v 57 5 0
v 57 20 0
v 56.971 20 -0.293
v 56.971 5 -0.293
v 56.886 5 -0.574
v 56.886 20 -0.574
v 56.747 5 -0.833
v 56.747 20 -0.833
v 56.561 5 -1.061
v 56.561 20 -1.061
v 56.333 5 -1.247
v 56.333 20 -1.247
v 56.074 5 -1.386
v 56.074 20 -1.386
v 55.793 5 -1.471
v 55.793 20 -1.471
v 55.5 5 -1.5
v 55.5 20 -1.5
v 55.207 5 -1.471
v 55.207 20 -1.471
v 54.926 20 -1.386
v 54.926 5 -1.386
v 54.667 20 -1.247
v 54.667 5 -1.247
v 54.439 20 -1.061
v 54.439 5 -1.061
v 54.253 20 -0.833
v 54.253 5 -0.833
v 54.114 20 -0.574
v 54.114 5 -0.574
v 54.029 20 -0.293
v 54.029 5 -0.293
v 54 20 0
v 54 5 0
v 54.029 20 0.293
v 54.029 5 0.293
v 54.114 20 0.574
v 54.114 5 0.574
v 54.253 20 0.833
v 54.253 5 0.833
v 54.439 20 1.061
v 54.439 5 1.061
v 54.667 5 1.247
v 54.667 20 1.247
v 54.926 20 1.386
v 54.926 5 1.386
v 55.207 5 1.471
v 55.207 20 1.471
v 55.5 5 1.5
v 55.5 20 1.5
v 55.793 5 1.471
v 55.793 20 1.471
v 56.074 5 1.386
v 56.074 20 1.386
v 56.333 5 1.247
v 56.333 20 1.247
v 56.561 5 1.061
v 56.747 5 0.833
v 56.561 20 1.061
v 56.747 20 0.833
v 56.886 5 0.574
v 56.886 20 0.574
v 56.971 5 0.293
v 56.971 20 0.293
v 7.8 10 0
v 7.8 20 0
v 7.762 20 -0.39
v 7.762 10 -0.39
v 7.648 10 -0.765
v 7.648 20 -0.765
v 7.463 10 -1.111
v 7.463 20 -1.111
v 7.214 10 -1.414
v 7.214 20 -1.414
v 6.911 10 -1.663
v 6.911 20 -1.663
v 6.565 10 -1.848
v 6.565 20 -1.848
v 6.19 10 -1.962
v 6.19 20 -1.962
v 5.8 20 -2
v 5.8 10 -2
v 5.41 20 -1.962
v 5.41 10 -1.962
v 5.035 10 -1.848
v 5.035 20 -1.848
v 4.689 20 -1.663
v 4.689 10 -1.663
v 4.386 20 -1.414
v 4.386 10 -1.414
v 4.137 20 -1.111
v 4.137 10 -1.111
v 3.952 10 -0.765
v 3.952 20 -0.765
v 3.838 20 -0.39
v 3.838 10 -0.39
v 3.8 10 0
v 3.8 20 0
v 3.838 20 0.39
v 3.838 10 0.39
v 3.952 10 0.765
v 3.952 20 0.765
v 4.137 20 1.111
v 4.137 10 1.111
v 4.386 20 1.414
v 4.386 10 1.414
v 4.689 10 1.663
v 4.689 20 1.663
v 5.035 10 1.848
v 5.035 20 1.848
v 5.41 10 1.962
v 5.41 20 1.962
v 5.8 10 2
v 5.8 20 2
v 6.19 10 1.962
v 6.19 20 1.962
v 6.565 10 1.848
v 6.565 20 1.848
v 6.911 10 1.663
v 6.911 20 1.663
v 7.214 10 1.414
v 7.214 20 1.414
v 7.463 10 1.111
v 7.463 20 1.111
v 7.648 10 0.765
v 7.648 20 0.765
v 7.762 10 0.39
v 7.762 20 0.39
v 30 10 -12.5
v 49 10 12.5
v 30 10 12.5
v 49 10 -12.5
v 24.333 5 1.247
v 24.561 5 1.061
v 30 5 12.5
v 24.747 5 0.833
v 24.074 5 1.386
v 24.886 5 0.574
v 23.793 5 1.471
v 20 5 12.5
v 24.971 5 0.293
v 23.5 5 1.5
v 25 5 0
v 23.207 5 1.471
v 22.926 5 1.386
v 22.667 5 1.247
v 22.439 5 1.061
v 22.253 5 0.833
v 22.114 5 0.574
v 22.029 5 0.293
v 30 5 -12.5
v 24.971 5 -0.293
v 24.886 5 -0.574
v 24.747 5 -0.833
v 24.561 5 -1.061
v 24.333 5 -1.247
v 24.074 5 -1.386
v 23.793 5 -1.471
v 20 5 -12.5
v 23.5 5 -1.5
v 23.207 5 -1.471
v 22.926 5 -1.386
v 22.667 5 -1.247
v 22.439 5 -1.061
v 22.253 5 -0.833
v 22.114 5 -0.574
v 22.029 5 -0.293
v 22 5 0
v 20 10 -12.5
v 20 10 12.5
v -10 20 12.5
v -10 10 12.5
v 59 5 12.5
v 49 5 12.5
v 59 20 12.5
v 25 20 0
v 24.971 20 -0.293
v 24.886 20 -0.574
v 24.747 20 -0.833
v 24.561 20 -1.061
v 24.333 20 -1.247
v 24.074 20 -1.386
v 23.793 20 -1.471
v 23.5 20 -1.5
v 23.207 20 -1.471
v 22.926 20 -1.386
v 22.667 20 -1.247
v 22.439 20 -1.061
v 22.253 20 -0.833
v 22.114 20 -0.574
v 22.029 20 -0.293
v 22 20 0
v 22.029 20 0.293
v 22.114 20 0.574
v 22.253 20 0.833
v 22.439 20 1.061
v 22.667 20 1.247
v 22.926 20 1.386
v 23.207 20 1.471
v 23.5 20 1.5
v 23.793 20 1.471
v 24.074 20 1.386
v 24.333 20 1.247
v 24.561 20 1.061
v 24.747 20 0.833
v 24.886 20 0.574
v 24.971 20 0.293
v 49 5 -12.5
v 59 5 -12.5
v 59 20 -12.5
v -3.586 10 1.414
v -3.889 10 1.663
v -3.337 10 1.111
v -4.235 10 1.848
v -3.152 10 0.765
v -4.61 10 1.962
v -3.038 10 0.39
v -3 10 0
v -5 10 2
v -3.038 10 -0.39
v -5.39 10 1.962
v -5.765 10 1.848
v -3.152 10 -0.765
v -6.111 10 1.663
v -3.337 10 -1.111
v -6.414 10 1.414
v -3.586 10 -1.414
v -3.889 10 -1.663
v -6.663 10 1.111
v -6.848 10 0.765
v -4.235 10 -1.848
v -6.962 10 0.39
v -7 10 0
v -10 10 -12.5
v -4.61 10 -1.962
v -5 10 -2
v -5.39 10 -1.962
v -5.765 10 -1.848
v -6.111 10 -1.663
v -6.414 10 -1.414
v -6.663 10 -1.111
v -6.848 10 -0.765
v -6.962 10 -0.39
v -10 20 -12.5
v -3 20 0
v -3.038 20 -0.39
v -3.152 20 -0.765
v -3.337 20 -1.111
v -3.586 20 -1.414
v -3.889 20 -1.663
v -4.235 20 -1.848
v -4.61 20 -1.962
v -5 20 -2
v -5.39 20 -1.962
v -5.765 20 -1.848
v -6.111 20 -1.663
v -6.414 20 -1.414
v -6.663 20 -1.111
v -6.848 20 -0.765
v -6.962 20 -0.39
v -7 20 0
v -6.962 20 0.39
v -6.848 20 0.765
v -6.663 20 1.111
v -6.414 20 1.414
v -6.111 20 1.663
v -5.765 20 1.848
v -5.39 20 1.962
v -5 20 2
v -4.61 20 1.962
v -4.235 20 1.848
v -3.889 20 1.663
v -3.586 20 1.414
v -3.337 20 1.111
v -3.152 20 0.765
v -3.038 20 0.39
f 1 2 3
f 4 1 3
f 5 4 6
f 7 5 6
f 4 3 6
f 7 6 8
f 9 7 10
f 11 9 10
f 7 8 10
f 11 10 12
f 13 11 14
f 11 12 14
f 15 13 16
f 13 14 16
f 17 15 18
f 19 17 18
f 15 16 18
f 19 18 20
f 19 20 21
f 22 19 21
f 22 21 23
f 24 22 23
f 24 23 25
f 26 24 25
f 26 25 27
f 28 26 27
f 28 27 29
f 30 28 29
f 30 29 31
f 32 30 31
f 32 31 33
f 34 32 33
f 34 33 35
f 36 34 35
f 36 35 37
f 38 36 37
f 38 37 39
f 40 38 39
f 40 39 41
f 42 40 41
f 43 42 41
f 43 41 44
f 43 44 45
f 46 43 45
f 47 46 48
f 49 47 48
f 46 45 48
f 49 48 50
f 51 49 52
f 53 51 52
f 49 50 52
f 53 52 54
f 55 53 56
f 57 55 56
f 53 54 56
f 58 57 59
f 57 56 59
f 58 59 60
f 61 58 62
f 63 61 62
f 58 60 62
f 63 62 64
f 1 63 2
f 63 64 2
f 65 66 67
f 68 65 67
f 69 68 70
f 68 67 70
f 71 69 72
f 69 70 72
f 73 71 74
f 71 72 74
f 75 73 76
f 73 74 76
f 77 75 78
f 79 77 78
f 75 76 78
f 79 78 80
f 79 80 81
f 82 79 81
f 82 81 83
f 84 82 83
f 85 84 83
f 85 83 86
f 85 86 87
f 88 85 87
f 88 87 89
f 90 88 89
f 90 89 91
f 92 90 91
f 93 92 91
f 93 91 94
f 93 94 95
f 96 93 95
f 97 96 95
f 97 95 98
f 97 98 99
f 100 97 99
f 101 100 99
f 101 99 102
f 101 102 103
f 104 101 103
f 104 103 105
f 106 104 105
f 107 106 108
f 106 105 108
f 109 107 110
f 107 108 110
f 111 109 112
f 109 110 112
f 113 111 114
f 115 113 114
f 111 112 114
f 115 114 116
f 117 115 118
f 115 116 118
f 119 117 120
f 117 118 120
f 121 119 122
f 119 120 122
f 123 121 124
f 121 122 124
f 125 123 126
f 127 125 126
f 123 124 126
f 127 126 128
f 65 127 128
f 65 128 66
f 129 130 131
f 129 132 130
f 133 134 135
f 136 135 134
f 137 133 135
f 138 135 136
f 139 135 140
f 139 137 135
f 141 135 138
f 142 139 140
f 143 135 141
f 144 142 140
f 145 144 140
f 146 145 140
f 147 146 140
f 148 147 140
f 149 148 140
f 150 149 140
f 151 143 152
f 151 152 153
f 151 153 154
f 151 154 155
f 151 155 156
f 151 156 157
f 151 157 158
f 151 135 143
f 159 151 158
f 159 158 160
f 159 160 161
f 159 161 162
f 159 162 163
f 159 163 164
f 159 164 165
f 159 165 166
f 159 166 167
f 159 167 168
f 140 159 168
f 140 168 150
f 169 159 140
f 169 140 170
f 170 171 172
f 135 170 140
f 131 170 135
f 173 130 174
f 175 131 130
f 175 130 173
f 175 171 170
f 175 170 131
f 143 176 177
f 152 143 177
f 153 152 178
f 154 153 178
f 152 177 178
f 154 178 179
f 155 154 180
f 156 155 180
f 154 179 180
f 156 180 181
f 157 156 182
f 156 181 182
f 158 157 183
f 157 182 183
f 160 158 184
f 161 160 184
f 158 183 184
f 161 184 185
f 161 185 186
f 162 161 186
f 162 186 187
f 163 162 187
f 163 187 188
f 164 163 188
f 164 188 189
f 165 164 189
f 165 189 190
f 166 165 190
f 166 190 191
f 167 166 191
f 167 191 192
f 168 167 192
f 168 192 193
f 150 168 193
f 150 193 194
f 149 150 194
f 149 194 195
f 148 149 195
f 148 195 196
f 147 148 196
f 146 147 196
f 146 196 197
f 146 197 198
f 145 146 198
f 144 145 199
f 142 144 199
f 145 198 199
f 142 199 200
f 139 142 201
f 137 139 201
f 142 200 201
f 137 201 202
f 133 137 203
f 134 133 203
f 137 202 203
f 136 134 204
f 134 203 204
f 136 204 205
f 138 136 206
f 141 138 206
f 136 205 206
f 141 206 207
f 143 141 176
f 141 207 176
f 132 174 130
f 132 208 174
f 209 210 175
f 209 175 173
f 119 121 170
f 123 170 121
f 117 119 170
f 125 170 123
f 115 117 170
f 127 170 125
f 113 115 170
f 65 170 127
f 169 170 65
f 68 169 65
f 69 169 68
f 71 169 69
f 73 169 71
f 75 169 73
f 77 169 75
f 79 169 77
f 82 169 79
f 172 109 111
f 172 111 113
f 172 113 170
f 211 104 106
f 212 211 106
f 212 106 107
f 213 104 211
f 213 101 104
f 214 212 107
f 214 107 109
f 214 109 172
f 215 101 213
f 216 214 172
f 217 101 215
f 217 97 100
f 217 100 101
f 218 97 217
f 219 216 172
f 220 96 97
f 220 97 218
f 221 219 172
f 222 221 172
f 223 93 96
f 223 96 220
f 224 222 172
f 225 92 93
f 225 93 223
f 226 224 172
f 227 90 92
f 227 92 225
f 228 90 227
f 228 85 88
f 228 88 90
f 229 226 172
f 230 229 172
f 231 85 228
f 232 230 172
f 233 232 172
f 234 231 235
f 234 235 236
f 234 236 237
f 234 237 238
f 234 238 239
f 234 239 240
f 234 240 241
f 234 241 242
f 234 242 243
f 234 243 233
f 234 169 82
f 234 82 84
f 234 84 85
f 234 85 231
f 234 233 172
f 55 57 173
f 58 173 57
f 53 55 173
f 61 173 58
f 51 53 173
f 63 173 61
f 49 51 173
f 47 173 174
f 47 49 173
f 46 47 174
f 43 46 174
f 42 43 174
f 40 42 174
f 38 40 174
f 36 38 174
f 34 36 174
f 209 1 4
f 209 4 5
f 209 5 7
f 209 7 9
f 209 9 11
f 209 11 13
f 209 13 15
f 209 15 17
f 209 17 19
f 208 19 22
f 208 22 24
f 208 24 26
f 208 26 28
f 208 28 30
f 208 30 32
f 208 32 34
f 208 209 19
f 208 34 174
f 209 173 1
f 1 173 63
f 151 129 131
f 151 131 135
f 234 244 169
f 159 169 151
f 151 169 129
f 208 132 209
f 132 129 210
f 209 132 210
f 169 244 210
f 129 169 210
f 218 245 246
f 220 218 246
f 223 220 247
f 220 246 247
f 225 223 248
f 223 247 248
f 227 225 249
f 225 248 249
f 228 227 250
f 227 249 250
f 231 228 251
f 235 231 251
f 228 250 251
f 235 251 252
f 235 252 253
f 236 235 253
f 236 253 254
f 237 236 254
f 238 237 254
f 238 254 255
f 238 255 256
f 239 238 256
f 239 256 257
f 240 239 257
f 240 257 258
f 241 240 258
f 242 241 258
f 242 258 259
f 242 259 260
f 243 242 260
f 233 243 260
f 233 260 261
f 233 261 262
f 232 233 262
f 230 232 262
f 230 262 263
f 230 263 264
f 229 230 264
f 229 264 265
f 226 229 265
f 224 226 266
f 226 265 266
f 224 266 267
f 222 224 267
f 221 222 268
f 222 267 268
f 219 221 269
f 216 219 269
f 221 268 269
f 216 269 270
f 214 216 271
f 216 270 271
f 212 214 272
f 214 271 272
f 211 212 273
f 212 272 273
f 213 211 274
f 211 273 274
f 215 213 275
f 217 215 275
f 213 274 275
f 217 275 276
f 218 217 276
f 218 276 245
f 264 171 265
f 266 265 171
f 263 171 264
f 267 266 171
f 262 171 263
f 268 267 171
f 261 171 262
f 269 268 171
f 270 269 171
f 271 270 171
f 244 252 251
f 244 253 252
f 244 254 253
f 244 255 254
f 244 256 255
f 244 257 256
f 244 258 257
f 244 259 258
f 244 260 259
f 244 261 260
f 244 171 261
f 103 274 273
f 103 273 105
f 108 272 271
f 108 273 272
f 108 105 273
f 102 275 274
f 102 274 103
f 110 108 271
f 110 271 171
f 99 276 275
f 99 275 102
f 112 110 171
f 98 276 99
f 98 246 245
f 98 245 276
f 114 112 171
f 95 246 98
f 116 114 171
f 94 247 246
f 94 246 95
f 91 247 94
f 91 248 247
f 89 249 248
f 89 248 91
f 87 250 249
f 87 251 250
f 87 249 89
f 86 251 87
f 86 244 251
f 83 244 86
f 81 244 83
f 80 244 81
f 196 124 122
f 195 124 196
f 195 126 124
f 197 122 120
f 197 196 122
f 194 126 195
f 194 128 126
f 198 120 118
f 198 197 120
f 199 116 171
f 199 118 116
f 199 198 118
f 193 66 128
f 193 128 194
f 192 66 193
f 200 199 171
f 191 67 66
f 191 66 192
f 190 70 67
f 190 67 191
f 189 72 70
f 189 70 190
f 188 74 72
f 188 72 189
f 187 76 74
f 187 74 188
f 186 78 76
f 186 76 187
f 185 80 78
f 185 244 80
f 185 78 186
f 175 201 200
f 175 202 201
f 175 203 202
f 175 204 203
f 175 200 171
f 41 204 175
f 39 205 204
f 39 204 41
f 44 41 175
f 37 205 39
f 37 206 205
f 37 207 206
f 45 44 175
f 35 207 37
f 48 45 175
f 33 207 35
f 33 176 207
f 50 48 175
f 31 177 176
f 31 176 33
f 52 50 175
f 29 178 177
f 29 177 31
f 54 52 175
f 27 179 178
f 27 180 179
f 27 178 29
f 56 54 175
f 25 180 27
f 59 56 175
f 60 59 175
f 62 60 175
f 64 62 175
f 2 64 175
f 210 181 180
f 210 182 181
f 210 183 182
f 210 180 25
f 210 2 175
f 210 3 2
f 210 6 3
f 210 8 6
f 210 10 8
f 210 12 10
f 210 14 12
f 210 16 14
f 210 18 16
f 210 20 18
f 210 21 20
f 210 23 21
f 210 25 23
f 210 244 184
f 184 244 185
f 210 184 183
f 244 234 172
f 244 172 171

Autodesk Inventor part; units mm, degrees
ref_plane "YZ Plane" through (0, 0, 0) normal (1, 0, 0) x (0, 1, 0)
ref_plane "XZ Plane" through (0, 0, 0) normal (0, 1, 0) x (-1, 0, 0)
ref_plane "XY Plane" through (0, 0, 0) normal (0, 0, 1) x (1, 0, 0)
sketch "Sketch1" plane through (0, 0, 0) normal (0, 0, 1) x (1, 0, 0)
  line L0 (-10, 10) -> (-10, 20)
  line L1 (-10, 20) -> (59, 20)
  line L2 (59, 20) -> (59, 5)
  line L3 (59, 5) -> (49, 5)
  line L4 (49, 5) -> (49, 10)
  line L5 (49, 10) -> (30, 10)
  line L6 (30, 10) -> (30, 5)
  line L7 (30, 5) -> (20, 5)
  line L8 (20, 5) -> (20, 10)
  line L9 (20, 10) -> (-10, 10)
  point P0 (0, 0)
  dimension "d0" = 19
  dimension "d1" = 10
  dimension "d2" = 10
  dimension "d3" = 30
  dimension "d4" = 10
  dimension "d5" = 5
  dimension "d6" = 59
  dimension "d7" = 10
extrude "Extrusion1" add sketch "Sketch1" along normal mid plane 25
sketch "Sketch2" plane through (-10, 20, 12.5) normal (0, 1, 0) x (1, 0, 0)
  circle A0 centre (5, 12.5) radius 2
  circle A1 centre (15.8, 12.5) radius 2
  line L0 (30, 25) -> (30, 0) projected
  line L1 (0, 25) -> (69, 25) projected
  line L2 (0, 0) -> (0, 25) projected
  circle A2 centre (65.5, 12.5) radius 1.5
  line L3 (69, 25) -> (69, 0) projected
  circle A3 centre (33.5, 12.5) radius 1.5
  point P0 (10, 12.5)
  dimension "d10" = 4
  dimension "d11" = 4
  dimension "d15" = 12.5
  dimension "d16" = 12.5
  dimension "d19" = 5
  dimension "d20" = 10.8
  dimension "d22" = 3
  dimension "d24" = 3.5
  dimension "d26" = 12.5
  dimension "d28" = 12.5
  dimension "d29" = 3
  dimension "d30" = 3.5
extrude "Extrusion2" cut sketch "Sketch2" against normal blind 15
properties part number "Load Cell holder" material "ABS Plastic"
